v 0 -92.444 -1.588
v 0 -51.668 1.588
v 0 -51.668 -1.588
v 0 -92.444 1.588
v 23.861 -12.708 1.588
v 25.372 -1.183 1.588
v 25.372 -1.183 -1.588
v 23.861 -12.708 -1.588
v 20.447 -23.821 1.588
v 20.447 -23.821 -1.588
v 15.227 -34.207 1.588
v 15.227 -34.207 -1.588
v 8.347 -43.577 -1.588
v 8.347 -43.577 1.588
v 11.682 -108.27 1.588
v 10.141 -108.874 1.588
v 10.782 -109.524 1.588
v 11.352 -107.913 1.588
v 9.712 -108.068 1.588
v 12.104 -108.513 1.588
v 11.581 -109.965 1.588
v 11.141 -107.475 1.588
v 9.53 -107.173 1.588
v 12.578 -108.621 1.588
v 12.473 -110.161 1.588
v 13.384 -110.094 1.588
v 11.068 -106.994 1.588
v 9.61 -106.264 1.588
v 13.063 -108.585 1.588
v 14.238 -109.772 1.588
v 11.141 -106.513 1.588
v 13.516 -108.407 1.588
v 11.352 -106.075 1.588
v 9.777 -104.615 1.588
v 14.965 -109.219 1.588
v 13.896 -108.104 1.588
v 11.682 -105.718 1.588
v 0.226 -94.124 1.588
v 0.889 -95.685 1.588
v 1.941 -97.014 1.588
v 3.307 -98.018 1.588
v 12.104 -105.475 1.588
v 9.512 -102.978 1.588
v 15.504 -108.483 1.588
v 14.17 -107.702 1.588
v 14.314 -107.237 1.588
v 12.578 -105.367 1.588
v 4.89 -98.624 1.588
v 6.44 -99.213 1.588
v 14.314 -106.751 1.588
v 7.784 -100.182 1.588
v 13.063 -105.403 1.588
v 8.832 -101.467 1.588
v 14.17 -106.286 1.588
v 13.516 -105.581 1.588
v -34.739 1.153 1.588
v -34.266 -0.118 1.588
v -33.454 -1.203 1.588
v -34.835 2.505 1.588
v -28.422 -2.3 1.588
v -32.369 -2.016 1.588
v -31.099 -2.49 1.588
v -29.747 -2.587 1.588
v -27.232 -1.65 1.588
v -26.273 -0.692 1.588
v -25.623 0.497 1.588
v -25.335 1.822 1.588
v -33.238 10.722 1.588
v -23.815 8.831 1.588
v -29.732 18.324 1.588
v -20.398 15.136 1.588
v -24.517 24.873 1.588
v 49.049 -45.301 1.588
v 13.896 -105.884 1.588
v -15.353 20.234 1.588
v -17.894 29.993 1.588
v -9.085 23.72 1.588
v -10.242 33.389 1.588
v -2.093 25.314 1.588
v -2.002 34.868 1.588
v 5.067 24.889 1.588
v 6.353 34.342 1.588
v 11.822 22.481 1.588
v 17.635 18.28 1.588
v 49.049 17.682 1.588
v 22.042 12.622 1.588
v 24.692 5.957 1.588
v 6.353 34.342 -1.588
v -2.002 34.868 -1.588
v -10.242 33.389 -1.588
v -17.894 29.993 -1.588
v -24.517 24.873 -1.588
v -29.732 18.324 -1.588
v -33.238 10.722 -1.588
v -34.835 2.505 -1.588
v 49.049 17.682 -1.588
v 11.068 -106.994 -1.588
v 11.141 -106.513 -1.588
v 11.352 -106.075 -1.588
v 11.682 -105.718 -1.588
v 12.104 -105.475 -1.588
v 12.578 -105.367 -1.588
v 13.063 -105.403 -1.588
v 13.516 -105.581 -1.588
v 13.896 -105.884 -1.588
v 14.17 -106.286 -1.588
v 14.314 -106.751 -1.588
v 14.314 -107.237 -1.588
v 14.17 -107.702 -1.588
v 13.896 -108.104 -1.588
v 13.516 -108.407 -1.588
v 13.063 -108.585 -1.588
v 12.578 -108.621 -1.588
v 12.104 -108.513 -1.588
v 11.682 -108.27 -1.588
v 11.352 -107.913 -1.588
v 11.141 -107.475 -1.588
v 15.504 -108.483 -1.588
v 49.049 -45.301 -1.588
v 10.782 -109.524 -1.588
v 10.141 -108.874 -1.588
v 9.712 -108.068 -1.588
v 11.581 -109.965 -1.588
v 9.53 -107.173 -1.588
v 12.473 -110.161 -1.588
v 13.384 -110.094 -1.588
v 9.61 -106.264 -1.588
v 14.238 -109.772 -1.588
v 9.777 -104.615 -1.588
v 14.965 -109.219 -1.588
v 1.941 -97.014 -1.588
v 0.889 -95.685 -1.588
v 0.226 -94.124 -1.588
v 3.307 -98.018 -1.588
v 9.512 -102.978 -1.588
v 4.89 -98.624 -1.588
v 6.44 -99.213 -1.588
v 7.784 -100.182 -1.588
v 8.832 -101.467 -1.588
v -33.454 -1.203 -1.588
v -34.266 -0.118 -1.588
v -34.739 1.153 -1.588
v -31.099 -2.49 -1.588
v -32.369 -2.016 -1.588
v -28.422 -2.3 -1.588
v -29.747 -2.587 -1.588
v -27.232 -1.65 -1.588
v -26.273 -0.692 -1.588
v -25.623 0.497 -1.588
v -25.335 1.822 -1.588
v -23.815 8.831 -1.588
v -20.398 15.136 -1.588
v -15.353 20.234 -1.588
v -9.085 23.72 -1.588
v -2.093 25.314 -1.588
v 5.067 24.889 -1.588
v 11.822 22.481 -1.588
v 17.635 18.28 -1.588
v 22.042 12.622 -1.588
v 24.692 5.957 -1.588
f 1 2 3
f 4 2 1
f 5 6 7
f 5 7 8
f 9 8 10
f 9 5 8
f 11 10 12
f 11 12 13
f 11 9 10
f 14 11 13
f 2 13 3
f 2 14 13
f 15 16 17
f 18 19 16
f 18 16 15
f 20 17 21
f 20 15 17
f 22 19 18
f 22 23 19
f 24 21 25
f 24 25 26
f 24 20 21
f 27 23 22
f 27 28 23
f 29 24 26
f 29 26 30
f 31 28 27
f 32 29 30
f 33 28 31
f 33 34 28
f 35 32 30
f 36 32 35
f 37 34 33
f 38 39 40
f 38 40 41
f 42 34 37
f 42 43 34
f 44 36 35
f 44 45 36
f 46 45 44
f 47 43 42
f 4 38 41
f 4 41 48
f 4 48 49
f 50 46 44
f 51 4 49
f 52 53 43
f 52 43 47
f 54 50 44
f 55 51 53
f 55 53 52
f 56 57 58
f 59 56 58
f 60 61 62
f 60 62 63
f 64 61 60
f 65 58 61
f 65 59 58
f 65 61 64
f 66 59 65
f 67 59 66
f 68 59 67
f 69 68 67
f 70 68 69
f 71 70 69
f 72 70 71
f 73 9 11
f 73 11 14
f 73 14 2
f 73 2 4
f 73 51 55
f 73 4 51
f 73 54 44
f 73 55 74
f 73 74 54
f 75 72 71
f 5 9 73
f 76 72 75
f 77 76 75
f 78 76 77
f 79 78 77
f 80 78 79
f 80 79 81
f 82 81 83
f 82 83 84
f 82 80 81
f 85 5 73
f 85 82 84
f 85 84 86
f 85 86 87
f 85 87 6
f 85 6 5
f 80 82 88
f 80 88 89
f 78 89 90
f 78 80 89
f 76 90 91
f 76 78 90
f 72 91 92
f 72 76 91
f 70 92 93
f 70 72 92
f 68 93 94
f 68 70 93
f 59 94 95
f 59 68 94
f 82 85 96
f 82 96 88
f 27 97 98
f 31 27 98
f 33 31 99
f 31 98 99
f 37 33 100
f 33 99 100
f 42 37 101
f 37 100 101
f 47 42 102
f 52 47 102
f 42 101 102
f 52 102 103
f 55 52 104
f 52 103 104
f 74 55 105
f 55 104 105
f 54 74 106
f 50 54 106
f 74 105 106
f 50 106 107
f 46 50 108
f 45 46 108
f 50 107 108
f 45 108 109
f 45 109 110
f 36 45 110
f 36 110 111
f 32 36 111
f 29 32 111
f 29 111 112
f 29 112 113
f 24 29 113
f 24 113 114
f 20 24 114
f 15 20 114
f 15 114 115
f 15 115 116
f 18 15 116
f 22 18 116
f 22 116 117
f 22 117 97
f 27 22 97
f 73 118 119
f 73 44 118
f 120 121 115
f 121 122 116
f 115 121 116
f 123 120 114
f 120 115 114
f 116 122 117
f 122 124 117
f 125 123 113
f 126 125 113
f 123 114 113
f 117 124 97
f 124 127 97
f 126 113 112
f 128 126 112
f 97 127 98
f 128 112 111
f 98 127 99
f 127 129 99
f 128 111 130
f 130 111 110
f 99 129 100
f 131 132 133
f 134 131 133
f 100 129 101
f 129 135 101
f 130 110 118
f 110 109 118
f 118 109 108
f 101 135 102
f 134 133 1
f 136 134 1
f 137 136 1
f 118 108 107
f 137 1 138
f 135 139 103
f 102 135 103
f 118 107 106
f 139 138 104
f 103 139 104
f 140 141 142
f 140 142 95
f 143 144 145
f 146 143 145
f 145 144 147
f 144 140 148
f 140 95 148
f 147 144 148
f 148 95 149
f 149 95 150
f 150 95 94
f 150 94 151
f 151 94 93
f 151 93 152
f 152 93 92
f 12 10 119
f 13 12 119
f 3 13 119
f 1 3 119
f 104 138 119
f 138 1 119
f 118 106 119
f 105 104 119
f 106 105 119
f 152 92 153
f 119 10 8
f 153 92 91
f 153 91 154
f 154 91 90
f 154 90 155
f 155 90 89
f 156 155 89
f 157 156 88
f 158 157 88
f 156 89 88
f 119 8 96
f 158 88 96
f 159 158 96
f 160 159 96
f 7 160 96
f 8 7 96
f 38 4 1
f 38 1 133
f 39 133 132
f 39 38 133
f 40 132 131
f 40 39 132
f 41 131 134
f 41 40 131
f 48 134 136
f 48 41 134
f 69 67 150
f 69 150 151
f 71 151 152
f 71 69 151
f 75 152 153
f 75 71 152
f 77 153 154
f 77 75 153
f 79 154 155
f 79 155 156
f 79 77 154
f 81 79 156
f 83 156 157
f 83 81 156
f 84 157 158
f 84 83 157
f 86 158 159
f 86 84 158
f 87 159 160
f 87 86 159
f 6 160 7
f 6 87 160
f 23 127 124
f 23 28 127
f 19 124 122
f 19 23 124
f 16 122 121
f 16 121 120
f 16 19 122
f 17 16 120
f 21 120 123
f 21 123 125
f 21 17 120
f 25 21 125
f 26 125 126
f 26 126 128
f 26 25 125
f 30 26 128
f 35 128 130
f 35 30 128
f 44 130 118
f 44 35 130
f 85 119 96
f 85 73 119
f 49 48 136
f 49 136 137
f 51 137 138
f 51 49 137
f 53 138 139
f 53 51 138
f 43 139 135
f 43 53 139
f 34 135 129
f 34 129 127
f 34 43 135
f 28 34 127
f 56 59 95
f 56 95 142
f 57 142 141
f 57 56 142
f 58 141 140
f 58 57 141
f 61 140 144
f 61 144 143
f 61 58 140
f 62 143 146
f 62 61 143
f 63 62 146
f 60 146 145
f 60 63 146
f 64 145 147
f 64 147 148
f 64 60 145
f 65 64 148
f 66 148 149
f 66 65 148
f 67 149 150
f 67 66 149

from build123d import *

# Parameters (mm, degrees)
SKETCH1_R             = 6.35
SKETCH1_R_2           = 3.175
BOSS_EXTRUDE1_DEPTH   = 1.5875
F_4_CLEARANCE_HOLE1_D = 3.2639


with BuildPart() as part:
    # Sketch1 → Boss-Extrude1 (new body, symmetric)
    with BuildSketch(Plane.XY):
        with BuildLine():
            Line((49.048701781, -45.301306076), (49.048701781, 17.681627212))
            Line((49.048701781, 17.681627212), (6.35250271, 34.342413053))
            ThreePointArc((6.35250271, 34.342413053), (-21.3593907, 27.632083778), (-34.835067544, 2.504734358))
            ThreePointArc((-34.835067544, 2.504734358), (-30.426385746, -2.587056811), (-25.334594577, 1.821624988))
            ThreePointArc((-25.334594577, 1.821624988), (1.502184662, 25.355540642), (25.372459089, -1.182505722))
            ThreePointArc((25.372459089, -1.182505722), (18.055035291, -29.123378386), (0, -51.667840164))
            Line((0, -51.667840164), (0, -92.444233417))
            ThreePointArc((0, -92.444233417), (6.35, -86.094233417), (12.7, -92.444233417))
            ThreePointArc((12.7, -92.444233417), (10.290303985, -97.423842288), (4.89007732, -98.624130323))
            ThreePointArc((4.89007732, -98.624130323), (8.832322877, -101.466501446), (9.610051547, -106.263949908))
            ThreePointArc((9.610051547, -106.263949908), (13.067449766, -103.840245814), (15.875, -106.993911248))
            ThreePointArc((15.875, -106.993911248), (15.780924606, -107.761067405), (15.504273342, -108.482761819))
            Line((15.504273342, -108.482761819), (49.048701781, -45.301306076))
        make_face()
        with Locations((6.35, -92.444233417)):
            Circle(SKETCH1_R)
        with Locations((12.7, -106.993911248)):
            Circle(SKETCH1_R_2)
    extrude(amount=BOSS_EXTRUDE1_DEPTH, both=True)

    # #4 Clearance Hole1 (through all)
    with Locations(Plane.XY.offset(1.5875)):
        with Locations((12.7, -106.993911248)):
            Hole(F_4_CLEARANCE_HOLE1_D / 2)


solid = part.part
